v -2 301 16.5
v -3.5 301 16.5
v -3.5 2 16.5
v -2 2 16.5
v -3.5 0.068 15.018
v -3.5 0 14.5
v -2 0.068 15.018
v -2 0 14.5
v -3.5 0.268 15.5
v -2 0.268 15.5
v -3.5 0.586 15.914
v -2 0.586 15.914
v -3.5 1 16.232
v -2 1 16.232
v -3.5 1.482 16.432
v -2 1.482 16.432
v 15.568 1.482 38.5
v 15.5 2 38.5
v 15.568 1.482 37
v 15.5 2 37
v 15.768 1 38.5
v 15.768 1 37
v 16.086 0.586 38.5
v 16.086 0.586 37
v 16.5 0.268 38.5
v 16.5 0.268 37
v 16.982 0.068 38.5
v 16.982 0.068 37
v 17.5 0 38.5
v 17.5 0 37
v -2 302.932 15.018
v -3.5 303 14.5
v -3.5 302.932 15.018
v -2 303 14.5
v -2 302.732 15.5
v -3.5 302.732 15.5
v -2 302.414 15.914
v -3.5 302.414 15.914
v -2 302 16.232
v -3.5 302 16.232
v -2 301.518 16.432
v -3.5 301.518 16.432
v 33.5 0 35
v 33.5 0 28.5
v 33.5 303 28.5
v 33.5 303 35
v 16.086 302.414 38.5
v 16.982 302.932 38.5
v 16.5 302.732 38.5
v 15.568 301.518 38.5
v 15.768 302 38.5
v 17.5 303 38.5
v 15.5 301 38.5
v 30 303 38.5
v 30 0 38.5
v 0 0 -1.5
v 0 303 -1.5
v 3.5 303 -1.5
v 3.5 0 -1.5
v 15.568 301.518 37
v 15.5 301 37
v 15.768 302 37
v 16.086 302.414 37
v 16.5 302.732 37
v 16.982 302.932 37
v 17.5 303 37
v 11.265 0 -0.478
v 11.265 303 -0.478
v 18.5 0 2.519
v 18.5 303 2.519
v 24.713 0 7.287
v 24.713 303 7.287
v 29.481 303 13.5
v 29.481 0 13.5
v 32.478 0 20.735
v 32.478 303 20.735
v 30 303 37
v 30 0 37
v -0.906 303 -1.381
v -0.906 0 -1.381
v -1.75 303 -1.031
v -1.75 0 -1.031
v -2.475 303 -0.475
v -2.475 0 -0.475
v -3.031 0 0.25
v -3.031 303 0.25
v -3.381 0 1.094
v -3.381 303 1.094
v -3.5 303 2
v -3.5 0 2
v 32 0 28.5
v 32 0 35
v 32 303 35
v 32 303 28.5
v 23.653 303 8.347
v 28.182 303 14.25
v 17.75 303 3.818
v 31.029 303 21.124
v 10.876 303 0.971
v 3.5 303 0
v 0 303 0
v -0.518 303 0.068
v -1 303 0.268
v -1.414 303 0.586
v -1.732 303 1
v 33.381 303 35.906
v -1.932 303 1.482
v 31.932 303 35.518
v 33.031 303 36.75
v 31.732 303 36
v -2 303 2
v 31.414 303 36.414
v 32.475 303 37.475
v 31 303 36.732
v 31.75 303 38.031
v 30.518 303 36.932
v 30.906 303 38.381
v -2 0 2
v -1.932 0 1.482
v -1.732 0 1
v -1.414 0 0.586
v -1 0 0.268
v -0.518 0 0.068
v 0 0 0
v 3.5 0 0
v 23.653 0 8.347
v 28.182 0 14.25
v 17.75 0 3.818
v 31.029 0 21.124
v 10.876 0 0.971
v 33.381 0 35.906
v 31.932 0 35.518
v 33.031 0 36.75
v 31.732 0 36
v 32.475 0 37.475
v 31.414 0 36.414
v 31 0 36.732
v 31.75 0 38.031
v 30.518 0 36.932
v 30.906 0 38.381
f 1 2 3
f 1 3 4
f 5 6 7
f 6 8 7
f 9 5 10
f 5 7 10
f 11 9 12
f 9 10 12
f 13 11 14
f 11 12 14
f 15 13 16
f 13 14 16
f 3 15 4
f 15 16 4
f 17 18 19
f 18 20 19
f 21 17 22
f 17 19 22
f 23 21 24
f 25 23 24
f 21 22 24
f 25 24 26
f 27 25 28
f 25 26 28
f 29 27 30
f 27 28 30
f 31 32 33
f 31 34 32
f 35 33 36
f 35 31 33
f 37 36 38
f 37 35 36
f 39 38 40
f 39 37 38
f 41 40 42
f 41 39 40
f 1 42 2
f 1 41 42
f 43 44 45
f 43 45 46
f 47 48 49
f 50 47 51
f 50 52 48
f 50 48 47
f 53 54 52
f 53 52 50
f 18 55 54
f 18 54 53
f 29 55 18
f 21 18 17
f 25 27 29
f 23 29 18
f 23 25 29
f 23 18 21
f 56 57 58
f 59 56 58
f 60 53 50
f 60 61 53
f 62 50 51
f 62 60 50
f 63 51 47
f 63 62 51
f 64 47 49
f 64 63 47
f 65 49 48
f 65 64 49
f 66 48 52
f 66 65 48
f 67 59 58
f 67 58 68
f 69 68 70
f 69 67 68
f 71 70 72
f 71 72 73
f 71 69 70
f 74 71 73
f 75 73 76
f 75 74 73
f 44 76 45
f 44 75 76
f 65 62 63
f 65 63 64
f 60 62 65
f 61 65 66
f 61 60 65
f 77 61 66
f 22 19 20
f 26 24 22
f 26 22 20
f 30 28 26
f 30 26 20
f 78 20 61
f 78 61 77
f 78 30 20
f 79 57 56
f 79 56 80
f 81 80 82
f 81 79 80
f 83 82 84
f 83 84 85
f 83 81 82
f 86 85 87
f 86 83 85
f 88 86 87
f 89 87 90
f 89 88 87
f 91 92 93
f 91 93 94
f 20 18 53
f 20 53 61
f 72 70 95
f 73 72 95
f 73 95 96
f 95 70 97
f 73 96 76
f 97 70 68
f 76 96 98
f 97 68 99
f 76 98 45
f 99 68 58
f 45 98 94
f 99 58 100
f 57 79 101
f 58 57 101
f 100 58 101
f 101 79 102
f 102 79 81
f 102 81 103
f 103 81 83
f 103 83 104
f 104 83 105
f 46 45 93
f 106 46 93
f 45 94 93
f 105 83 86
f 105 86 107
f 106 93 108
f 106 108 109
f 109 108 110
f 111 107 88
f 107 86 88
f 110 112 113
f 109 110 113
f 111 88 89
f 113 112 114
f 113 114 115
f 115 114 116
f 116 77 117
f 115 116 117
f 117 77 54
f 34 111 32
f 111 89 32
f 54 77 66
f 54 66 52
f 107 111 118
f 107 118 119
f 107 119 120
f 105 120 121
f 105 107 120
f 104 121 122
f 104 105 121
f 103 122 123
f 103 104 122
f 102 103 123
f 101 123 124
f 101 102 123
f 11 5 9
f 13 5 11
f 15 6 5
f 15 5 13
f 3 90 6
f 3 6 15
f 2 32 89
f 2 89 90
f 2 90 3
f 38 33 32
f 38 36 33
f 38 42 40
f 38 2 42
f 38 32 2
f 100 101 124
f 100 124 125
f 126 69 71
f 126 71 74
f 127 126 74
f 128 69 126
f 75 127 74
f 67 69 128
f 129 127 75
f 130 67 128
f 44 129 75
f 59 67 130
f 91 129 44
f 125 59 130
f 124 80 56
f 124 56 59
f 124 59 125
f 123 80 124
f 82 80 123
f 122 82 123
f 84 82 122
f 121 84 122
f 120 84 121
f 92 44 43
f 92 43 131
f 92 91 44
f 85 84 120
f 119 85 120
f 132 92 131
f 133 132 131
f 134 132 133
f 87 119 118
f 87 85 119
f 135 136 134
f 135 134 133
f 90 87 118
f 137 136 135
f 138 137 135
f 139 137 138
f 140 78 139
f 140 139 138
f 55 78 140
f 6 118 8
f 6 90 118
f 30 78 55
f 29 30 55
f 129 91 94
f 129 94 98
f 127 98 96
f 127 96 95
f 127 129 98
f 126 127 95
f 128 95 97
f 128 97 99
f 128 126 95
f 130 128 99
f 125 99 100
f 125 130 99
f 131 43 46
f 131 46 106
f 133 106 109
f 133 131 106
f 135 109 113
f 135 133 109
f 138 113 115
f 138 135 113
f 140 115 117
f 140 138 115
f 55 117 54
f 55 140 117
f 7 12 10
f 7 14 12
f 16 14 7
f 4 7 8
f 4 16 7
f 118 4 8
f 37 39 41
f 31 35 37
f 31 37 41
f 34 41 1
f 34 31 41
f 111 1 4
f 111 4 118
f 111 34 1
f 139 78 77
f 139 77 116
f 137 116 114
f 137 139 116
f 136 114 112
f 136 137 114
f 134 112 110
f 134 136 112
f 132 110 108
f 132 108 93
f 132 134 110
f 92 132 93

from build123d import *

# Parameters (mm, degrees)
SKETCH_8_W              = 3.5
SKETCH_8_H              = 303
SM_BASE_FLANGE_3_DEPTH  = 1.5
SM_EDGE_FLANGE_4_DEPTH  = 303
SM_EDGE_FLANGE_9_DEPTH  = 303
SM_EDGE_FLANGE_10_DEPTH = 303
FILLET_1_R              = 2


# Sheet-metal steps are written as plain solids
with BuildPart() as part:
    # Эскиз8 → Базовая кромка3 (new body)
    with BuildSketch(Plane.XY):
        with Locations((1.75, 151.5)):
            Rectangle(SKETCH_8_W, SKETCH_8_H)
    extrude(amount=-SM_BASE_FLANGE_3_DEPTH)

    # Ребро-кромка4 section (across the edge) → Ребро-кромка4 (add)
    with BuildSketch(Plane(origin=(32, 0, 0), x_dir=(-1, 0, 0), z_dir=(0, 1, 0))):
        with BuildLine():
            Line((-1.5, 28.5), (-1.5, 35))
            Line((-1.5, 35), (0, 35))
            Line((0, 35), (0, 28.5))
            ThreePointArc((0, 28.5), (8.347456736, 8.347456736), (28.5, 0))
            Line((28.5, 0), (28.5, -1.5))
            ThreePointArc((28.5, -1.5), (7.286796564, 7.286796564), (-1.5, 28.5))
        make_face()
    extrude(amount=SM_EDGE_FLANGE_4_DEPTH)

    # Ребро-кромка9 section (across the edge) → Ребро-кромка9 (add)
    with BuildSketch(Plane(origin=(-2, 303, 0), x_dir=(1, 0, 0), z_dir=(0, -1, 0))):
        with BuildLine():
            Line((-1.5, 2), (-1.5, 16.5))
            Line((-1.5, 16.5), (0, 16.5))
            Line((0, 16.5), (0, 2))
            ThreePointArc((0, 2), (0.585786438, 0.585786438), (2, 0))
            Line((2, 0), (2, -1.5))
            ThreePointArc((2, -1.5), (-0.474873734, -0.474873734), (-1.5, 2))
        make_face()
    extrude(amount=SM_EDGE_FLANGE_9_DEPTH)

    # Ребро-кромка10 section (across the edge) → Ребро-кромка10 (add)
    with BuildSketch(Plane(origin=(32, 0, 37), x_dir=(0, 0, -1), z_dir=(0, 1, 0))):
        with BuildLine():
            Line((-1.5, 2), (-1.5, 16.5))
            Line((-1.5, 16.5), (0, 16.5))
            Line((0, 16.5), (0, 2))
            ThreePointArc((0, 2), (0.585786438, 0.585786438), (2, 0))
            Line((2, 0), (2, -1.5))
            ThreePointArc((2, -1.5), (-0.474873734, -0.474873734), (-1.5, 2))
        make_face()
    extrude(amount=SM_EDGE_FLANGE_10_DEPTH)

    # Скругление1
    fillet_1_edges = [part.edges().sort_by_distance(p)[0] for p in [
        (-2.75, 303, 16.5),
        (-2.75, 0, 16.5),
        (15.5, 0, 37.75),
        (15.5, 303, 37.75),
    ]]
    fillet(fillet_1_edges, radius=FILLET_1_R)


solid = part.part
